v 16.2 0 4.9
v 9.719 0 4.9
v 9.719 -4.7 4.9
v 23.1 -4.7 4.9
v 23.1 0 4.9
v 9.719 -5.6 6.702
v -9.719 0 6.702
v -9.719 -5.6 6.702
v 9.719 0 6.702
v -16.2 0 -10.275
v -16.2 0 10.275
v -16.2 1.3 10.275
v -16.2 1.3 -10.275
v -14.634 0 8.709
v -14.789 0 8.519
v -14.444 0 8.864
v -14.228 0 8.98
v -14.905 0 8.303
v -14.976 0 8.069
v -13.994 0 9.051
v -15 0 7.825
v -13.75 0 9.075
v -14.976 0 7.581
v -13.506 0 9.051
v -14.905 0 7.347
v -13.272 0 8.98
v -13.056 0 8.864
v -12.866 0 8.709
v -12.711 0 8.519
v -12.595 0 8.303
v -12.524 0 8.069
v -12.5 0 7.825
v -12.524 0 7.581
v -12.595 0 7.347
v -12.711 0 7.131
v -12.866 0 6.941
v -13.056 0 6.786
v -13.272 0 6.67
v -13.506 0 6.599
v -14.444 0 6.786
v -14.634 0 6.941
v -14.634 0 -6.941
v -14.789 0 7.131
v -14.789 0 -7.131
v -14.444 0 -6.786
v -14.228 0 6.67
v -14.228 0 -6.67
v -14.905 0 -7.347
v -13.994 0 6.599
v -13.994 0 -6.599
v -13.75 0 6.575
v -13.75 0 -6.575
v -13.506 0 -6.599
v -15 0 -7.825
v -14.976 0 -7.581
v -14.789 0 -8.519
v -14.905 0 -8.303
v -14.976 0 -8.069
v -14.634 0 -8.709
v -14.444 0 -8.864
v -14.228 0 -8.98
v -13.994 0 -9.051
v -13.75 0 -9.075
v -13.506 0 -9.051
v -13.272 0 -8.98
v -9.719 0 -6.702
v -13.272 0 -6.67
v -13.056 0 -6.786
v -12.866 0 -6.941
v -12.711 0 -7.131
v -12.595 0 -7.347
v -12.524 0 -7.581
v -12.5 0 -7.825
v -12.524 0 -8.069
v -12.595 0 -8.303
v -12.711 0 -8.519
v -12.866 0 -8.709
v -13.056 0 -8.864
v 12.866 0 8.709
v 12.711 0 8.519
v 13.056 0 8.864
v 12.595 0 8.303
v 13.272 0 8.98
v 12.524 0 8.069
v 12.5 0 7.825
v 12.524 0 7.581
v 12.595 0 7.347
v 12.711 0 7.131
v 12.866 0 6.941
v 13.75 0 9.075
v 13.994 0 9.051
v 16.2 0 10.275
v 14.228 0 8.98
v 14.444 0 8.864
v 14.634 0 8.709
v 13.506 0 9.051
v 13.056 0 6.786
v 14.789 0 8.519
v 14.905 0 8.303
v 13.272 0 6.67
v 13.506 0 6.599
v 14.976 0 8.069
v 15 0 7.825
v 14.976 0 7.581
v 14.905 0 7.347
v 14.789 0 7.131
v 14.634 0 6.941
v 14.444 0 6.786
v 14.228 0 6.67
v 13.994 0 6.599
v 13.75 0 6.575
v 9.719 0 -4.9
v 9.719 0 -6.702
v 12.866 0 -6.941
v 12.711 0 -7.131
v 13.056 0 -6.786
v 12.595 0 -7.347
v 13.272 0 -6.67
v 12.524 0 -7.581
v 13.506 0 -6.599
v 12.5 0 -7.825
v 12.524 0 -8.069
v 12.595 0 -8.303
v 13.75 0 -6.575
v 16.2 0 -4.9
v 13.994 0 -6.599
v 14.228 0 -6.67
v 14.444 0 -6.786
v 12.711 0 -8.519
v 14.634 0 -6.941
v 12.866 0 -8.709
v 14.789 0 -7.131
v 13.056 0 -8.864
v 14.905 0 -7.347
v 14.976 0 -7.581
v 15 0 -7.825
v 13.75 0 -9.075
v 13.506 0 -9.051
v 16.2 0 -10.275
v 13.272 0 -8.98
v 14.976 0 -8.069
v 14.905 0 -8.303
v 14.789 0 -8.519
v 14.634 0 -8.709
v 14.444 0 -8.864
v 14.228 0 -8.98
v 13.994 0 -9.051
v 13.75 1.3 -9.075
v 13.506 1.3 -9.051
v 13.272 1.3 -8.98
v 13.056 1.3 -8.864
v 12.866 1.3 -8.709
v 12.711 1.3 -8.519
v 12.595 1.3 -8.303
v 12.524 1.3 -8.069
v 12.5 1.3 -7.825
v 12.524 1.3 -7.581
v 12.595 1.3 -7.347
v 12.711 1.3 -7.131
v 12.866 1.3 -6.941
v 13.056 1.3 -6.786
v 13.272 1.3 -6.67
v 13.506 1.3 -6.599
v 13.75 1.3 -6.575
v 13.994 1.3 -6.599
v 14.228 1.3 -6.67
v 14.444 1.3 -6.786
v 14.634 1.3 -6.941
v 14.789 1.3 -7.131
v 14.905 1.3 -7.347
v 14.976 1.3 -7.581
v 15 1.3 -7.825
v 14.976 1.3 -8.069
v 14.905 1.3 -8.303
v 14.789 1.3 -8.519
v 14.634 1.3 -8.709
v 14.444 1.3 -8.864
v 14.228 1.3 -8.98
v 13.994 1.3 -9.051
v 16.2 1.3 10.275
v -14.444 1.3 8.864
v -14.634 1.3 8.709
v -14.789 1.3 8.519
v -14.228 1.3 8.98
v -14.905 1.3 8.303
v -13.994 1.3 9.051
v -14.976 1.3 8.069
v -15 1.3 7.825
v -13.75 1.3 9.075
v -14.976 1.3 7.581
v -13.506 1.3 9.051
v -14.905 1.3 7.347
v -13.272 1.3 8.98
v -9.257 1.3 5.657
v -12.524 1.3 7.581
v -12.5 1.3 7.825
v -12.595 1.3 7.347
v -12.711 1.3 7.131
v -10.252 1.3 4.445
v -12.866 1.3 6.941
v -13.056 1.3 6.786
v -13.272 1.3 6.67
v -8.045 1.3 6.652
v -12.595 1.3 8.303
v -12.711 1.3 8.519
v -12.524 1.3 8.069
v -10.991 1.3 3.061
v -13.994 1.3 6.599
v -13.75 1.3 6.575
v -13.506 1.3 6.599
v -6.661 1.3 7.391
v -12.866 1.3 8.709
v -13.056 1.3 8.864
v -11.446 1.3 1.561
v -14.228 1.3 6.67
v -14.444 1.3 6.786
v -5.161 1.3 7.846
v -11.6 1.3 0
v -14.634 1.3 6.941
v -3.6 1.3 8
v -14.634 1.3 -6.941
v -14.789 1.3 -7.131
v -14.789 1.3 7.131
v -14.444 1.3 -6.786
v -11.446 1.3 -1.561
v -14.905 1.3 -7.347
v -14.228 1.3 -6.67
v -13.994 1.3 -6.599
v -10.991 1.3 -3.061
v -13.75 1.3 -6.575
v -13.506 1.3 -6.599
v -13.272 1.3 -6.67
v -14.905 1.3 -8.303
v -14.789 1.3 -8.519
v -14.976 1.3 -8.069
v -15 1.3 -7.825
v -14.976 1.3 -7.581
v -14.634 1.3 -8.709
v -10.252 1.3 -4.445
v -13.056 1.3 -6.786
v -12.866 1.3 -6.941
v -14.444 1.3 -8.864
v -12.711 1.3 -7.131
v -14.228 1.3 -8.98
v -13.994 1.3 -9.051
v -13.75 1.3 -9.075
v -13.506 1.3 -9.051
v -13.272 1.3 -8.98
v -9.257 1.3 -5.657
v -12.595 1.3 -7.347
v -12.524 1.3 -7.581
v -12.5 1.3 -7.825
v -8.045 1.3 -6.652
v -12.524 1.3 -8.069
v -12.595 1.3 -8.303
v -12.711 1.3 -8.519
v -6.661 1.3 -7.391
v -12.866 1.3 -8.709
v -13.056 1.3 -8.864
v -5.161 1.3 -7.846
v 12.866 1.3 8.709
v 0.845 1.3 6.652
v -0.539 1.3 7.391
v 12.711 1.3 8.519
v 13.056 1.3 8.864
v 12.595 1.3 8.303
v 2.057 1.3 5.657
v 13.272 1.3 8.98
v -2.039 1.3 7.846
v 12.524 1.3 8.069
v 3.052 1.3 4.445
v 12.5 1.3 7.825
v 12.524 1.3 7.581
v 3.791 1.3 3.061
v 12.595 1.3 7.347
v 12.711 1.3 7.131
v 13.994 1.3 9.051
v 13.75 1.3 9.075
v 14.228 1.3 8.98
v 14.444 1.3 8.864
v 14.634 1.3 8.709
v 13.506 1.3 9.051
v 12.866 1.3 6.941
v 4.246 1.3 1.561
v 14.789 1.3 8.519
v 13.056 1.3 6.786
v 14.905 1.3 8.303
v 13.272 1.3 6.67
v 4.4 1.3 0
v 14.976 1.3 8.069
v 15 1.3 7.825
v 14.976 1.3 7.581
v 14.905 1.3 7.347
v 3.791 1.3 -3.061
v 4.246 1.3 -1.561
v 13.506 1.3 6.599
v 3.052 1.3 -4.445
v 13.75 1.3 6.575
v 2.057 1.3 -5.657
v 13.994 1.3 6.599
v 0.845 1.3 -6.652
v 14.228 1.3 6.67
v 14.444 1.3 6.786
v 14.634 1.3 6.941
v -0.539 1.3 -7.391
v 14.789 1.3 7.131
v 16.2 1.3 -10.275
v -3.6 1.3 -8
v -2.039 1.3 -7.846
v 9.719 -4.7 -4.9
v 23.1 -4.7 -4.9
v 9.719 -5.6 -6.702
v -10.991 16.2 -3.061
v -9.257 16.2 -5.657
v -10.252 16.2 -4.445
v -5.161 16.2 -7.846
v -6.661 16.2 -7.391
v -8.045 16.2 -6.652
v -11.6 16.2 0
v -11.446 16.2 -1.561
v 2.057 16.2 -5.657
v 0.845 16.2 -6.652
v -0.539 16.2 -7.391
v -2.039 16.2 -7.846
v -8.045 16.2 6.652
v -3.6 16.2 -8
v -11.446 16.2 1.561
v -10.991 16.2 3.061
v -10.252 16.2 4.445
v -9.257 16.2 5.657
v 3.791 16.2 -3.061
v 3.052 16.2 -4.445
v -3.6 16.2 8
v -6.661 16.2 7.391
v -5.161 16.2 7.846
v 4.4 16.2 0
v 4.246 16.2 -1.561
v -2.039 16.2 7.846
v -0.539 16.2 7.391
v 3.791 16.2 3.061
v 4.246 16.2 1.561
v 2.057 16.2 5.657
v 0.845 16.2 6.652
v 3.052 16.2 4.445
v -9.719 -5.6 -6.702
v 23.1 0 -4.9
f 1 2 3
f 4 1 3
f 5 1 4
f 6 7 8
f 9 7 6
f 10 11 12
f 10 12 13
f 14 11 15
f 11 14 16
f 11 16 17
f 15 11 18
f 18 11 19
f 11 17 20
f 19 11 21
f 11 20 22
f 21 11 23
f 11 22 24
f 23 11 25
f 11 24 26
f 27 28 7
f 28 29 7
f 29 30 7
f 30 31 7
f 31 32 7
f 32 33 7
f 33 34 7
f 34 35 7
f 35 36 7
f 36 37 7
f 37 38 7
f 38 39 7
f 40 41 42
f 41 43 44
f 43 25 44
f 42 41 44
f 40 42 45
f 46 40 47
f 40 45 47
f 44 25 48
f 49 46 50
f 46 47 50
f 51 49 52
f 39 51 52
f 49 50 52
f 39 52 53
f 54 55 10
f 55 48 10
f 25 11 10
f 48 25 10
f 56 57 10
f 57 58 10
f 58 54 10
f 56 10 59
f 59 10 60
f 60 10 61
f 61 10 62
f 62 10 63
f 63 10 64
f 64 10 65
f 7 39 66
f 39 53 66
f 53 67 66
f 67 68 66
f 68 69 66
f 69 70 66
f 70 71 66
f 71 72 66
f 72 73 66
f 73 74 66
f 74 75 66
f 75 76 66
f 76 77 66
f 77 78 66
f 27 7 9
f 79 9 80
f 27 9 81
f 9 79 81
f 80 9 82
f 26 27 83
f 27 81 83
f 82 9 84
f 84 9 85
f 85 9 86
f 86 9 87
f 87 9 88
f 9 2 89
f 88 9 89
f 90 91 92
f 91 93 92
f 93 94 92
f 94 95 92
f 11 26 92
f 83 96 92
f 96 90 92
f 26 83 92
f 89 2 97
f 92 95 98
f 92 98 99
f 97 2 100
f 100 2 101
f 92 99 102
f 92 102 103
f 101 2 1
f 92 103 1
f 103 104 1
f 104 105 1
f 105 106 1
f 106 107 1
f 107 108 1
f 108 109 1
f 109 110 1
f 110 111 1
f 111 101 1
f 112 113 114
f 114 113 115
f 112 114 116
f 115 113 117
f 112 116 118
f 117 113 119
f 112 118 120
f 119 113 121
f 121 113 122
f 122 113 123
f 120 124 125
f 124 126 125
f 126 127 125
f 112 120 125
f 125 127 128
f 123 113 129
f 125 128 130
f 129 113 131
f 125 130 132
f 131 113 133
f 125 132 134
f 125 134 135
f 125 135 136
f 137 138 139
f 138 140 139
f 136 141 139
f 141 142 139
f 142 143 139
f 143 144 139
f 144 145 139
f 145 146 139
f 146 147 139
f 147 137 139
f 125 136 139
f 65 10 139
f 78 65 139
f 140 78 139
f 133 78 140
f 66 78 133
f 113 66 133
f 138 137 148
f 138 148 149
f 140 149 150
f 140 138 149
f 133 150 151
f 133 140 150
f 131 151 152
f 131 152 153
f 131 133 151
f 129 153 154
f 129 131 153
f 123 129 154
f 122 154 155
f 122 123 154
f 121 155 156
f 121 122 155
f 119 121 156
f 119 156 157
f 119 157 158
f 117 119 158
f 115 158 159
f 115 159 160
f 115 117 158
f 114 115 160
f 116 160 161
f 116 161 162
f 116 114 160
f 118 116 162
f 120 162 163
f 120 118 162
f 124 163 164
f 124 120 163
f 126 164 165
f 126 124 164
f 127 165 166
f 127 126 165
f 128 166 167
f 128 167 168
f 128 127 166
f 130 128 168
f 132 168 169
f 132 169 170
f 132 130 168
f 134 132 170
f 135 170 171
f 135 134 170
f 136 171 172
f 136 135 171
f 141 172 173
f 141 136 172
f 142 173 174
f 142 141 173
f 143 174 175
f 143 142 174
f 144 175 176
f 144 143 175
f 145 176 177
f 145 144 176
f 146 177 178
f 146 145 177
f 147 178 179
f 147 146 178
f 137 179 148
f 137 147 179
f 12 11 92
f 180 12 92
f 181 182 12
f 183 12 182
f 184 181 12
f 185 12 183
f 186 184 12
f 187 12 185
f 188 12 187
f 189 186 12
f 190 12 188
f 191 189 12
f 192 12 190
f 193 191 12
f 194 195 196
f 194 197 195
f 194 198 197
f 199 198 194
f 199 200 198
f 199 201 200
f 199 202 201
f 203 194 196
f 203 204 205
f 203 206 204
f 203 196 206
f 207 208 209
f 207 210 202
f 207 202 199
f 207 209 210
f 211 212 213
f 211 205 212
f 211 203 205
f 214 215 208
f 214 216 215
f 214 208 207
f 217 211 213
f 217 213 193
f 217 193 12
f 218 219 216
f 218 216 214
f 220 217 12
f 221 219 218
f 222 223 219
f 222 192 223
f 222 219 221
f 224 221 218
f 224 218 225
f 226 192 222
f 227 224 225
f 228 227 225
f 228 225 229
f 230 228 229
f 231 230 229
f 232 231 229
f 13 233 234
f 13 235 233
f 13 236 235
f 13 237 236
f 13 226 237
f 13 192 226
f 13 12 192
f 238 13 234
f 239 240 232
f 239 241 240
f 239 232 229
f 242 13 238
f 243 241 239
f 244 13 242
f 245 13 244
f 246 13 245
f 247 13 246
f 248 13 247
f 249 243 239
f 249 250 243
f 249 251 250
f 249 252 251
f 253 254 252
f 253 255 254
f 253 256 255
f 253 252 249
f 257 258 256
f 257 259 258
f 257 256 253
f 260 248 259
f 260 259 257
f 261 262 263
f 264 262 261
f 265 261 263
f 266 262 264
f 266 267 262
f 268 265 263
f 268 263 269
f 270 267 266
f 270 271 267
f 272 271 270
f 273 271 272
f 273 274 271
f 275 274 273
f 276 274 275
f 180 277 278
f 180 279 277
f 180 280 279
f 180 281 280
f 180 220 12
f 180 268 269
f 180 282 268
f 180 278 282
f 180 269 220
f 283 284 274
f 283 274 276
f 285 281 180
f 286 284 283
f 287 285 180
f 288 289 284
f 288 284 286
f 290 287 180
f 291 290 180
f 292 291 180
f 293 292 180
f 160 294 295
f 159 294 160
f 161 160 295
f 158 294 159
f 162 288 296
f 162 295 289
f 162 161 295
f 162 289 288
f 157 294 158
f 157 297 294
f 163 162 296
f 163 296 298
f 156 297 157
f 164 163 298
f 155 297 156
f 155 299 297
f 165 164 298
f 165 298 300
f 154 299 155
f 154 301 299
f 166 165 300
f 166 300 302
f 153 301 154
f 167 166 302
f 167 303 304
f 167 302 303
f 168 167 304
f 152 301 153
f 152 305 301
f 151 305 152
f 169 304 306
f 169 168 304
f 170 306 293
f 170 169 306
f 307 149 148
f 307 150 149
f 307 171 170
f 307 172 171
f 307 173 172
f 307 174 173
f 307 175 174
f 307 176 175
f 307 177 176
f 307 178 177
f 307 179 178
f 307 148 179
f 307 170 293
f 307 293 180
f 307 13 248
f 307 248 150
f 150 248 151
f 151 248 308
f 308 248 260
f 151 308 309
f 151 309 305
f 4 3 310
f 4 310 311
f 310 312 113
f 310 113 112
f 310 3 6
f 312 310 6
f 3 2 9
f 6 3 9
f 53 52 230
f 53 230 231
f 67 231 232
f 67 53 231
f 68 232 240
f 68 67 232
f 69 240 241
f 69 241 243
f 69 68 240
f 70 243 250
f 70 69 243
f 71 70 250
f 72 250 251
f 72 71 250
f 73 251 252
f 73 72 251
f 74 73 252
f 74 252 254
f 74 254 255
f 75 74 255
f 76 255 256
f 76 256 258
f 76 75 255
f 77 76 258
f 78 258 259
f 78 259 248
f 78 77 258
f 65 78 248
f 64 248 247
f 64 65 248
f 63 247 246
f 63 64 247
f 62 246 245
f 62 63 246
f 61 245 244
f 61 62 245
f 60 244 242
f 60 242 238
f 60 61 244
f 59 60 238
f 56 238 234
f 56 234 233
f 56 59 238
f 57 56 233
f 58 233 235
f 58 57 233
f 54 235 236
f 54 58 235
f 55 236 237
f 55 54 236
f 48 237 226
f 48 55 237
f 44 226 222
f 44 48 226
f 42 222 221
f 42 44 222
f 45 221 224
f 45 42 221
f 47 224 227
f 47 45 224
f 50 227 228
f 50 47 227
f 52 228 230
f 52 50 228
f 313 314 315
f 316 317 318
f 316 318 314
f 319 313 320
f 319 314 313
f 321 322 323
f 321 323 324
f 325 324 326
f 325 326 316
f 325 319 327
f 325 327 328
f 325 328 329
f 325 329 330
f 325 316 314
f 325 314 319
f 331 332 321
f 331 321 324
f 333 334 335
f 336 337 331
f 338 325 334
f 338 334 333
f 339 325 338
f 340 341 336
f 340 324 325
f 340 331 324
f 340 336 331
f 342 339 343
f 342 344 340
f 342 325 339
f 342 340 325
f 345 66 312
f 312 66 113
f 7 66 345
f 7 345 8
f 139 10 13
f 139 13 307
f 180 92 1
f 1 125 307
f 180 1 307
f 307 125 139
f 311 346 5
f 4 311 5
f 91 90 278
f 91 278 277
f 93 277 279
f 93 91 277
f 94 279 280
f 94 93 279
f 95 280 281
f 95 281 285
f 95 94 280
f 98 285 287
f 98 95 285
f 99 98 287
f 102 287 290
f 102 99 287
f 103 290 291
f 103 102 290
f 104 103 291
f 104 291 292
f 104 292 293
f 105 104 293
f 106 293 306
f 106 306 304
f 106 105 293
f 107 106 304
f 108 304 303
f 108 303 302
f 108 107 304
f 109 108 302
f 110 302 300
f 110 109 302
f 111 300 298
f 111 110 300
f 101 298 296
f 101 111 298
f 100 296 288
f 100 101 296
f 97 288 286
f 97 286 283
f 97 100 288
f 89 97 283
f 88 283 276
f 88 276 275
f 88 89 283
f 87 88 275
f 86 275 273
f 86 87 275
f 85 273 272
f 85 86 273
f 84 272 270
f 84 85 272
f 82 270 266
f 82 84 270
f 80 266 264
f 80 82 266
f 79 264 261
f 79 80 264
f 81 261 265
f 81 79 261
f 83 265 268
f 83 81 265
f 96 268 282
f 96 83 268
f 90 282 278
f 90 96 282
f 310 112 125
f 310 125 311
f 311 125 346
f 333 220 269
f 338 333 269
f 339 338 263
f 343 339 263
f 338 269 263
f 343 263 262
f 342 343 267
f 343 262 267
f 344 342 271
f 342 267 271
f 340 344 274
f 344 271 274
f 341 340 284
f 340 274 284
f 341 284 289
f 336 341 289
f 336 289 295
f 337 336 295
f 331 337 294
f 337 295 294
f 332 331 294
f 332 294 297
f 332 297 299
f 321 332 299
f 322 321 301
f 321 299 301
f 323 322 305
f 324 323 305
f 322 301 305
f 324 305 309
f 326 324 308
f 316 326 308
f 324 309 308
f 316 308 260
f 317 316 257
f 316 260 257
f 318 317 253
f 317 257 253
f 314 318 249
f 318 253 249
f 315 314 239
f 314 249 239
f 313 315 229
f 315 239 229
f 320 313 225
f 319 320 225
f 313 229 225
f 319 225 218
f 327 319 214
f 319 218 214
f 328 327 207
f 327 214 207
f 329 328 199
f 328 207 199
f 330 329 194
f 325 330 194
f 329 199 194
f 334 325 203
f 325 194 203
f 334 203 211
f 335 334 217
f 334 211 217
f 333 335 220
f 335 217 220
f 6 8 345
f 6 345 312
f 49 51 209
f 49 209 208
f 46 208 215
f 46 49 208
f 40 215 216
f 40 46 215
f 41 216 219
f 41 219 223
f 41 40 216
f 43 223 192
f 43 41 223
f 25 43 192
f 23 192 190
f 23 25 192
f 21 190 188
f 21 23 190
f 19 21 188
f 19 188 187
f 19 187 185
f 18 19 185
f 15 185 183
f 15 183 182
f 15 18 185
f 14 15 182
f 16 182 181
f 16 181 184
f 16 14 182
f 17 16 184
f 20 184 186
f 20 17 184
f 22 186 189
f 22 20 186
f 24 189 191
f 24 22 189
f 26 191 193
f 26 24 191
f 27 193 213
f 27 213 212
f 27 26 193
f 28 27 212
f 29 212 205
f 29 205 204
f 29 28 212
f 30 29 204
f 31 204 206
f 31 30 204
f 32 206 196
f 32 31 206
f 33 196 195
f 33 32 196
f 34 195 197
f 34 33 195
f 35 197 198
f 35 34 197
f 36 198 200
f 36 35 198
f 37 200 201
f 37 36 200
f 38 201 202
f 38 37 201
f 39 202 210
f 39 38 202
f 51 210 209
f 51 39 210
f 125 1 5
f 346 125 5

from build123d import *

# Parameters (mm, degrees)
SKETCH1_W           = 32.4
SKETCH1_H           = 20.55
SKETCH1_R           = 1.25
BOSS_EXTRUDE1_DEPTH = 1.3
SKETCH2_R           = 8
BOSS_EXTRUDE2_DEPTH = 14.9
SKETCH3_W           = 19.437089118
SKETCH3_H           = 13.404889048
BOSS_EXTRUDE3_DEPTH = 5.6
SKETCH4_W           = 13.8
SKETCH4_H           = 9.8
BOSS_EXTRUDE4_DEPTH = 4.7


with BuildPart() as part:
    # Sketch1 → Boss-Extrude1 (new body)
    with BuildSketch(Plane(origin=(0, 0, 0), x_dir=(1, 0, 0), z_dir=(0, 1, 0))):
        Rectangle(SKETCH1_W, SKETCH1_H)
        with Locations(Location((-13.75, 7.825, 0), (0, 0, 270))):
            Circle(SKETCH1_R, mode=Mode.SUBTRACT)
        with Locations(Location((-13.75, -7.825, 0), (0, 0, 90))):
            Circle(SKETCH1_R, mode=Mode.SUBTRACT)
        with Locations(Location((13.75, -7.825, 0), (0, 0, 270))):
            Circle(SKETCH1_R, mode=Mode.SUBTRACT)
        with Locations(Location((13.75, 7.825, 0), (0, 0, 90))):
            Circle(SKETCH1_R, mode=Mode.SUBTRACT)
    extrude(amount=BOSS_EXTRUDE1_DEPTH)

    # Sketch2 → Boss-Extrude2 (add)
    with BuildSketch(Plane(origin=(0, 1.3, 0), x_dir=(1, 0, 0), z_dir=(0, 1, 0))):
        with Locations(Location((-3.6, 0, 0), (0, 0, 270))):
            Circle(SKETCH2_R)
    extrude(amount=BOSS_EXTRUDE2_DEPTH)

    # Sketch3 → Boss-Extrude3 (add)
    with BuildSketch(Plane.XZ):
        Rectangle(SKETCH3_W, SKETCH3_H)
    extrude(amount=BOSS_EXTRUDE3_DEPTH)

    # Sketch4 → Boss-Extrude4 (add)
    with BuildSketch(Plane.XZ):
        with Locations((16.2, 0)):
            Rectangle(SKETCH4_W, SKETCH4_H)
    extrude(amount=BOSS_EXTRUDE4_DEPTH)


solid = part.part
